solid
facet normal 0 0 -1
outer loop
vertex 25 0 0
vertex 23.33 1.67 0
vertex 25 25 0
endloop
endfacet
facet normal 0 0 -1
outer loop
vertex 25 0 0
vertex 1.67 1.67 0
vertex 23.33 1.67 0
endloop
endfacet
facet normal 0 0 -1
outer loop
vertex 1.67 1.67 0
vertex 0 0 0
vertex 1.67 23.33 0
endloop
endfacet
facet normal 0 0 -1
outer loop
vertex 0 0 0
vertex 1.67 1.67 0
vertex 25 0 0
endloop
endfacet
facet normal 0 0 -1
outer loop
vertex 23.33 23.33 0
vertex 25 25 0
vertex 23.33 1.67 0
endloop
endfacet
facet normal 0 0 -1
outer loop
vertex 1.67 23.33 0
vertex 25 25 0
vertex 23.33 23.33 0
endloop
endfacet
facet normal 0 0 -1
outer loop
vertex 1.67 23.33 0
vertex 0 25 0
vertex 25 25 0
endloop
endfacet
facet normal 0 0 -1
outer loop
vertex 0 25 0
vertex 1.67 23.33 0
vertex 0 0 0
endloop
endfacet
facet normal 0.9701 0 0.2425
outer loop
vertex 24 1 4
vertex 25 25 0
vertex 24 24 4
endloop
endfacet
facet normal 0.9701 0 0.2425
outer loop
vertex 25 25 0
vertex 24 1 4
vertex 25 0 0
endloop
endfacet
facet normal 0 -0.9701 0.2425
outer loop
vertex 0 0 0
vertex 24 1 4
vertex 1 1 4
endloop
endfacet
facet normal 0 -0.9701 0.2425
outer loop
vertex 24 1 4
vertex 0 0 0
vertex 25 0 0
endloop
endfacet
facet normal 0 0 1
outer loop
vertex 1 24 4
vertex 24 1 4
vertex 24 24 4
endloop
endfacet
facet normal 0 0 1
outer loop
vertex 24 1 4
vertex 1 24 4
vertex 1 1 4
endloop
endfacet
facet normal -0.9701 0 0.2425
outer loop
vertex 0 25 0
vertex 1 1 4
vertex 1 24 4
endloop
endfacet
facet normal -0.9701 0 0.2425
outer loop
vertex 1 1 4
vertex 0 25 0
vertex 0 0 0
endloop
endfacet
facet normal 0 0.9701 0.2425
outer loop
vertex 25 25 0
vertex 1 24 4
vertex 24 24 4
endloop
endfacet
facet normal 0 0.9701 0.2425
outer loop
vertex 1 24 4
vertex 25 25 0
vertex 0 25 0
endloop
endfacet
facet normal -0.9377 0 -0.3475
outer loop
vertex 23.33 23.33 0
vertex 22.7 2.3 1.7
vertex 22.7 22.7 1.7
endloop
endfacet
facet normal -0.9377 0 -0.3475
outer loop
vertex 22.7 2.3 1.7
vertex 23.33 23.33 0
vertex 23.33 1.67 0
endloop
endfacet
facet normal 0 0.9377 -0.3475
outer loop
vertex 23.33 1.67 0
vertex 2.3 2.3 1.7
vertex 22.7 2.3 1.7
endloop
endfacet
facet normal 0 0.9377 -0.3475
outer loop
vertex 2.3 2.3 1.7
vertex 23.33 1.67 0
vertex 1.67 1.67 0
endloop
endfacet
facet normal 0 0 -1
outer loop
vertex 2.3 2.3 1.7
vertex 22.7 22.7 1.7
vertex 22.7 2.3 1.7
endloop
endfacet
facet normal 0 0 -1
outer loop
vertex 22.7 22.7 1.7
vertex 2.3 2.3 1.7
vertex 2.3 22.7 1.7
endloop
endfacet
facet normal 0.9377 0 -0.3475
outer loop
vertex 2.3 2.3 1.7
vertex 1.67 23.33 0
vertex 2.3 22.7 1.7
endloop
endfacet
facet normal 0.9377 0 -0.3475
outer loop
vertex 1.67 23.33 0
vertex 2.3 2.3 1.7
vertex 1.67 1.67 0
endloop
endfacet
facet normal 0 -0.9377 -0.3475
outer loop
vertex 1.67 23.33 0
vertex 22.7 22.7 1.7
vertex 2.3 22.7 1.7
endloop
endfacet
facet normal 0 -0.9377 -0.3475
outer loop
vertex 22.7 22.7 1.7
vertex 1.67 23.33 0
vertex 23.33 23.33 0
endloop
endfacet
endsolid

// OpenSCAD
// Copyright 2023 Stefano Linguerri
//
// Licensed under the Apache License, Version 2.0 (the "License");
// you may not use this file except in compliance with the License.
// You may obtain a copy of the License at
// http://www.apache.org/licenses/LICENSE-2.0
//
// Unless required by applicable law or agreed to in writing, software
// distributed under the License is distributed on an "AS IS" BASIS,
// WITHOUT WARRANTIES OR CONDITIONS OF ANY KIND, either express or implied.¢
// See the License for the specific language governing permissions and
// limitations under the License.

//height (thickness) of this tray
height = 4;//0.1
//base width 
base_width = 25;
//base length 
base_length = 25;
//thickness of the top and sides of the base
height_offset = 1.3;
//Inset of the top of the tray: greater the value greater the slope of the tray
inset = 1;
//magnets height 
magnets_height = 0.1;
//magnets diameter
magnets_diameter = 0.1;
//magnets type
magnets_type = "0"; // [0:None, 1:Auto]

base_type = "0"; // [0:Hollow, 1:Solid]
//slotta hole width
slotta_width = 2;//0.1
//slotta hole length
slotta_length = 18;//0.1
//slotta hole depth
slotta_depth = 4;//0.1
//slotta type
slotta_type = "0"; // [0:None, 1:Parallel Center, 2:Parallel 3/4, 3:Diagonal, 4:Cavalry]
//slotta gap (cavalry type only)
slotta_gap = 2.5;//0.1

module tray(offset, zOffset, height, base_width, base_length, inset) {
    
        
        b_total_cols = (base_width);
        b_total_rows = (base_length);
        
        t_total_cols = (base_width - inset *2);
        t_total_rows = (base_length - inset *2);
    
        translate(
            [offset,
            offset,
            zOffset]
        )

        polyhedron(
            points=[
                    [0,0,0],                        //base bottom left
                    [b_total_cols,0,0],             //base bottom right
                    [b_total_cols,b_total_rows,0],  //base top right
                    [0,b_total_rows,0],             //base top left


                    [inset,  inset,   height],                              //surface bottom left
                    [inset + t_total_cols, inset,  height],                 //surface bottom right
                    [inset + t_total_cols, inset + t_total_rows, height],   //surface top right
                    [inset,   inset + t_total_rows,  height]                //surface top left
                ],
            faces =[
                        [0,1,2,3],
                        [4,5,1,0],
                        [5,6,2,1],
                        [6,7,3,2],
                        [7,4,0,3],
                        [7,6,5,4]
                    ]
        ); 
           
}

module slotta (base_width, base_length,slotta_width,slotta_height,slotta_type) {
    if(slotta_type == "1"){
        translate( 
            [(base_width - slotta_length)/2, base_width/2, height]
        )
        cube(size = [slotta_length,slotta_width,slotta_height+0.2]);
    }
    
    if(slotta_type == "2"){
        translate( 
            [(base_width - slotta_length)/2, base_width/4, height]
        )
        cube(size = [slotta_length,slotta_width,slotta_height+0.2]);
    }
    
    if(slotta_type == "3"){

        let(cathetus_slotta_width = slotta_width/sqrt(2),cathetus_slotta_lenght = slotta_length/sqrt(2)){
            echo(">>>>",cathetus_slotta_lenght)
            translate( 
                [(base_width/2)-(cathetus_slotta_lenght/2), (base_length/2) -(cathetus_slotta_lenght/2), height]
            )

            rotate(45)

            cube(size = [slotta_length,slotta_width,slotta_height+0.2]);
                    
        }
    }

    if(slotta_type == "4"){
        
        translate( 
            [(base_width / 2) - (slotta_width / 2) - slotta_gap,(base_length - slotta_length)/2, height - slotta_height - 0.1]
        )
        cube(size = [slotta_width,slotta_length,slotta_height+0.2]);

        translate( 
            [(base_width / 2) - (slotta_width / 2) + slotta_gap,(base_length - slotta_length)/2, height - slotta_height - 0.1]
        )
        cube(size = [slotta_width,slotta_length,slotta_height+0.2]);
    }
}

module magnets_holes (base_width, base_length, magnets_height, magnets_diameter, z_offset = -0.1) {   
    translate( 
        [base_width/2,
        base_length/2, 
        z_offset]
    )
    cylinder(d = magnets_diameter, h = magnets_height+0.01,$fn=30);
}

difference(){  
    
    color ([0.5, 0.5, 0.5]) {
        tray(0,0, height, base_width, base_length, inset);
    }
    
    if(base_type == "0"){
        color ([0.7, 0.7, 0.7]) {                   
            tray(height_offset, -1.0, height - height_offset, base_width - (2*height_offset), base_length - (2 * height_offset), inset);
        }   
    }
    
    if (magnets_type == "1" && base_type == "1" && magnets_height > 0.1){     
        magnets_holes (base_width, base_length, magnets_height, magnets_diameter);            
    }
      
    slotta(base_width,base_length,slotta_width,slotta_depth+0.01,slotta_type);
}

if(magnets_type == "1"  && base_type == "0" && magnets_height > 0.1){
    if(slotta_type != "0"){
        difference(){
            difference() {
                magnets_holes (base_width, base_length, height - 0.1, magnets_diameter + (2 * height_offset) + slotta_gap * 2);        
                magnets_holes (base_width, base_length, magnets_height + 0.2, magnets_diameter, -0.2);        
            }
            slotta(base_width,base_length,slotta_width,slotta_depth,slotta_type);
        }
    }
}
